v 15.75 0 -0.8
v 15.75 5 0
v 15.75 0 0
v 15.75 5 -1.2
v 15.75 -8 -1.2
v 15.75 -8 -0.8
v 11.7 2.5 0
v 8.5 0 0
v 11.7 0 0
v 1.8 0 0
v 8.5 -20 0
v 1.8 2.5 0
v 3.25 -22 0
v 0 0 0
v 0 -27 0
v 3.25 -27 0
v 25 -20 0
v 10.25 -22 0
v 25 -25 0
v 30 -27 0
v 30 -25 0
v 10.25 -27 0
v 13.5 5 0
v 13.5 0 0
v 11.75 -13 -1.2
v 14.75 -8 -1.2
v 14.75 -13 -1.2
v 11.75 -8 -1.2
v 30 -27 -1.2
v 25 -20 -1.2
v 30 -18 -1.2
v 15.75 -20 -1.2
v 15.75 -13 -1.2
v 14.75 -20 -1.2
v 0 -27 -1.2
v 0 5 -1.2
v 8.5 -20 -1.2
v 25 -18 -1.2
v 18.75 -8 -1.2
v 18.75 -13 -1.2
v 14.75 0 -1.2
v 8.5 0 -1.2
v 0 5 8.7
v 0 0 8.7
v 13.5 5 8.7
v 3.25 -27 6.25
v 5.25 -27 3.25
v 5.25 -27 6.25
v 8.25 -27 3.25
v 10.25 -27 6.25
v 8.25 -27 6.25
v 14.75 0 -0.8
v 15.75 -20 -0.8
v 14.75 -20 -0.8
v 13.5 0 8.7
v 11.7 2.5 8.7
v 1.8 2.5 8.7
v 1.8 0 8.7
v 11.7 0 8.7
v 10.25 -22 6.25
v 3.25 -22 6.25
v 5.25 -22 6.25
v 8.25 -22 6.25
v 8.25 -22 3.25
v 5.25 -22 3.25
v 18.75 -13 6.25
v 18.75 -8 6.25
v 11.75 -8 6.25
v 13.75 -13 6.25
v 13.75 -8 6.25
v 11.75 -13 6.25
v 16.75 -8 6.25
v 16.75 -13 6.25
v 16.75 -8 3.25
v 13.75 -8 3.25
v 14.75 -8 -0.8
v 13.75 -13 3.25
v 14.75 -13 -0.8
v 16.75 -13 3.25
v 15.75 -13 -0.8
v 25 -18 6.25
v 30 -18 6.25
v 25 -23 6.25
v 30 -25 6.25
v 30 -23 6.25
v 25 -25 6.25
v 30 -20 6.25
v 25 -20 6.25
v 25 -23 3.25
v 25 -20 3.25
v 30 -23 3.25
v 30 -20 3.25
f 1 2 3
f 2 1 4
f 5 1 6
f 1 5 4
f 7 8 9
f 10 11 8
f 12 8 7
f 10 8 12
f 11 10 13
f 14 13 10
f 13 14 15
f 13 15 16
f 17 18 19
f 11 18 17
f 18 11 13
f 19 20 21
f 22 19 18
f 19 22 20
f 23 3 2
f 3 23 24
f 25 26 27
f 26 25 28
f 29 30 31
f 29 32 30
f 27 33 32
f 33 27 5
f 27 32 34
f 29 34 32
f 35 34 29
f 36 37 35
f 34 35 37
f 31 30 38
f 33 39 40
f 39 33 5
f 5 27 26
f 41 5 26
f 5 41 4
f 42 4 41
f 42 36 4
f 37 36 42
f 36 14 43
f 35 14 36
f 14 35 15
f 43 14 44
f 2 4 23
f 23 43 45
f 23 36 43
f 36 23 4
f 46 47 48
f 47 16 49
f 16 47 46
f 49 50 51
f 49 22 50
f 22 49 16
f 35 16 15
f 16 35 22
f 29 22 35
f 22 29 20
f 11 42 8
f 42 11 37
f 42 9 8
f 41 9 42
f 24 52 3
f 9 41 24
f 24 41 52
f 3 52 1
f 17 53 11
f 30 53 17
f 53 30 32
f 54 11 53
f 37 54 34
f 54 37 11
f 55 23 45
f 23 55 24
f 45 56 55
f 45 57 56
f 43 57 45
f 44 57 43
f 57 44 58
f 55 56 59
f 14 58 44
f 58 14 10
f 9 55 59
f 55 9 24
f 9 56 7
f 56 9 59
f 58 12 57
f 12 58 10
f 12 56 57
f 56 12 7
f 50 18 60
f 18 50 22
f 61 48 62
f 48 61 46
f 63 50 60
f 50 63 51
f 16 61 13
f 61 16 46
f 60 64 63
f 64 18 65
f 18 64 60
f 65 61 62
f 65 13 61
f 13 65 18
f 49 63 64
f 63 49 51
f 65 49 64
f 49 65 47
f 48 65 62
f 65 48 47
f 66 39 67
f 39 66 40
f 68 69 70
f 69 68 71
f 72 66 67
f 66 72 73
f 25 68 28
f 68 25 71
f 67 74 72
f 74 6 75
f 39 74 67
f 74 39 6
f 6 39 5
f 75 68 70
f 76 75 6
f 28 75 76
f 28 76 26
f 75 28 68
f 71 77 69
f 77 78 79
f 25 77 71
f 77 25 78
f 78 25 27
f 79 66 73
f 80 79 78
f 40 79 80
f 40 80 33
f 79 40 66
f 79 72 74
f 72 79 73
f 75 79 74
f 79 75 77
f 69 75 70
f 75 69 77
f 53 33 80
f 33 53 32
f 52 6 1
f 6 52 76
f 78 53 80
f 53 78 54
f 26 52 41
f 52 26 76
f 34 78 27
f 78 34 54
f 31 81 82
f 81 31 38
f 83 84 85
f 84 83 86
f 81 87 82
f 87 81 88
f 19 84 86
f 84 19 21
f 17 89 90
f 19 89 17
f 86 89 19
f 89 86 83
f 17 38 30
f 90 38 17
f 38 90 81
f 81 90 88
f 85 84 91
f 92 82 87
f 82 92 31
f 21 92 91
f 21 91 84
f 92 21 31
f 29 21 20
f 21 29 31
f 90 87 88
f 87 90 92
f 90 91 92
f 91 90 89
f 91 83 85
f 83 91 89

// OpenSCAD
module nailheadholder(headradius)
{
  difference()
  {
    cube(size=[2*headradius+4,5,2*headradius-0.8]);

    translate(v=[1.8,0,0])
      cube(size=[2*headradius+0.4,2.5,2*headradius-0.8]);
  }

}

module nailstemholder(radius,headradius)
{
  difference()
  {
    cube(size=[2*radius+4,5,headradius+radius]);

    translate(v=[2,0,headradius-radius])
      cube(size=[2*radius,5,2*radius]);
  }
}

module coilholder(radius,headradius)
{
  difference()
  {
    translate(v=[0,-27,-1.2])
      cube(size=[2*headradius+6.25,27+5,1.2]);

    translate(v=[2*headradius+4-5,-20,-1.2])
      cube(size=[7.25,20,1.2]);
  }

  nailheadholder(headradius);

  translate(v=[headradius-radius,-27,0])
    nailstemholder(radius,headradius);
}

module poleholder(radius,headradius)
{
  nailstemholder(radius,headradius);

  translate(v=[0,0,-1.2])
    cube(size=[2*radius+4,5,1.2]);

  translate(v=[3,-10,-1.2])
    cube(size=[1.0,28,0.4]);

}

module ncholder(radius,headradius)
{
  translate(v=[0,2,0])
    rotate([0,0,90])
      nailstemholder(radius,headradius);

  translate(v=[-5,2,-1.2])
    cube(size=[5,7,1.2]);
  translate(v=[-22,0,-1.2])
    cube(size=[22,7,1.2]);
}

union()
{
  coilholder(1.5,4.75);

  translate(v=[11.75,-13,0])
    poleholder(1.5,4.75);

  translate(v=[30,-27,0])
    ncholder(1.5,4.75);
}
